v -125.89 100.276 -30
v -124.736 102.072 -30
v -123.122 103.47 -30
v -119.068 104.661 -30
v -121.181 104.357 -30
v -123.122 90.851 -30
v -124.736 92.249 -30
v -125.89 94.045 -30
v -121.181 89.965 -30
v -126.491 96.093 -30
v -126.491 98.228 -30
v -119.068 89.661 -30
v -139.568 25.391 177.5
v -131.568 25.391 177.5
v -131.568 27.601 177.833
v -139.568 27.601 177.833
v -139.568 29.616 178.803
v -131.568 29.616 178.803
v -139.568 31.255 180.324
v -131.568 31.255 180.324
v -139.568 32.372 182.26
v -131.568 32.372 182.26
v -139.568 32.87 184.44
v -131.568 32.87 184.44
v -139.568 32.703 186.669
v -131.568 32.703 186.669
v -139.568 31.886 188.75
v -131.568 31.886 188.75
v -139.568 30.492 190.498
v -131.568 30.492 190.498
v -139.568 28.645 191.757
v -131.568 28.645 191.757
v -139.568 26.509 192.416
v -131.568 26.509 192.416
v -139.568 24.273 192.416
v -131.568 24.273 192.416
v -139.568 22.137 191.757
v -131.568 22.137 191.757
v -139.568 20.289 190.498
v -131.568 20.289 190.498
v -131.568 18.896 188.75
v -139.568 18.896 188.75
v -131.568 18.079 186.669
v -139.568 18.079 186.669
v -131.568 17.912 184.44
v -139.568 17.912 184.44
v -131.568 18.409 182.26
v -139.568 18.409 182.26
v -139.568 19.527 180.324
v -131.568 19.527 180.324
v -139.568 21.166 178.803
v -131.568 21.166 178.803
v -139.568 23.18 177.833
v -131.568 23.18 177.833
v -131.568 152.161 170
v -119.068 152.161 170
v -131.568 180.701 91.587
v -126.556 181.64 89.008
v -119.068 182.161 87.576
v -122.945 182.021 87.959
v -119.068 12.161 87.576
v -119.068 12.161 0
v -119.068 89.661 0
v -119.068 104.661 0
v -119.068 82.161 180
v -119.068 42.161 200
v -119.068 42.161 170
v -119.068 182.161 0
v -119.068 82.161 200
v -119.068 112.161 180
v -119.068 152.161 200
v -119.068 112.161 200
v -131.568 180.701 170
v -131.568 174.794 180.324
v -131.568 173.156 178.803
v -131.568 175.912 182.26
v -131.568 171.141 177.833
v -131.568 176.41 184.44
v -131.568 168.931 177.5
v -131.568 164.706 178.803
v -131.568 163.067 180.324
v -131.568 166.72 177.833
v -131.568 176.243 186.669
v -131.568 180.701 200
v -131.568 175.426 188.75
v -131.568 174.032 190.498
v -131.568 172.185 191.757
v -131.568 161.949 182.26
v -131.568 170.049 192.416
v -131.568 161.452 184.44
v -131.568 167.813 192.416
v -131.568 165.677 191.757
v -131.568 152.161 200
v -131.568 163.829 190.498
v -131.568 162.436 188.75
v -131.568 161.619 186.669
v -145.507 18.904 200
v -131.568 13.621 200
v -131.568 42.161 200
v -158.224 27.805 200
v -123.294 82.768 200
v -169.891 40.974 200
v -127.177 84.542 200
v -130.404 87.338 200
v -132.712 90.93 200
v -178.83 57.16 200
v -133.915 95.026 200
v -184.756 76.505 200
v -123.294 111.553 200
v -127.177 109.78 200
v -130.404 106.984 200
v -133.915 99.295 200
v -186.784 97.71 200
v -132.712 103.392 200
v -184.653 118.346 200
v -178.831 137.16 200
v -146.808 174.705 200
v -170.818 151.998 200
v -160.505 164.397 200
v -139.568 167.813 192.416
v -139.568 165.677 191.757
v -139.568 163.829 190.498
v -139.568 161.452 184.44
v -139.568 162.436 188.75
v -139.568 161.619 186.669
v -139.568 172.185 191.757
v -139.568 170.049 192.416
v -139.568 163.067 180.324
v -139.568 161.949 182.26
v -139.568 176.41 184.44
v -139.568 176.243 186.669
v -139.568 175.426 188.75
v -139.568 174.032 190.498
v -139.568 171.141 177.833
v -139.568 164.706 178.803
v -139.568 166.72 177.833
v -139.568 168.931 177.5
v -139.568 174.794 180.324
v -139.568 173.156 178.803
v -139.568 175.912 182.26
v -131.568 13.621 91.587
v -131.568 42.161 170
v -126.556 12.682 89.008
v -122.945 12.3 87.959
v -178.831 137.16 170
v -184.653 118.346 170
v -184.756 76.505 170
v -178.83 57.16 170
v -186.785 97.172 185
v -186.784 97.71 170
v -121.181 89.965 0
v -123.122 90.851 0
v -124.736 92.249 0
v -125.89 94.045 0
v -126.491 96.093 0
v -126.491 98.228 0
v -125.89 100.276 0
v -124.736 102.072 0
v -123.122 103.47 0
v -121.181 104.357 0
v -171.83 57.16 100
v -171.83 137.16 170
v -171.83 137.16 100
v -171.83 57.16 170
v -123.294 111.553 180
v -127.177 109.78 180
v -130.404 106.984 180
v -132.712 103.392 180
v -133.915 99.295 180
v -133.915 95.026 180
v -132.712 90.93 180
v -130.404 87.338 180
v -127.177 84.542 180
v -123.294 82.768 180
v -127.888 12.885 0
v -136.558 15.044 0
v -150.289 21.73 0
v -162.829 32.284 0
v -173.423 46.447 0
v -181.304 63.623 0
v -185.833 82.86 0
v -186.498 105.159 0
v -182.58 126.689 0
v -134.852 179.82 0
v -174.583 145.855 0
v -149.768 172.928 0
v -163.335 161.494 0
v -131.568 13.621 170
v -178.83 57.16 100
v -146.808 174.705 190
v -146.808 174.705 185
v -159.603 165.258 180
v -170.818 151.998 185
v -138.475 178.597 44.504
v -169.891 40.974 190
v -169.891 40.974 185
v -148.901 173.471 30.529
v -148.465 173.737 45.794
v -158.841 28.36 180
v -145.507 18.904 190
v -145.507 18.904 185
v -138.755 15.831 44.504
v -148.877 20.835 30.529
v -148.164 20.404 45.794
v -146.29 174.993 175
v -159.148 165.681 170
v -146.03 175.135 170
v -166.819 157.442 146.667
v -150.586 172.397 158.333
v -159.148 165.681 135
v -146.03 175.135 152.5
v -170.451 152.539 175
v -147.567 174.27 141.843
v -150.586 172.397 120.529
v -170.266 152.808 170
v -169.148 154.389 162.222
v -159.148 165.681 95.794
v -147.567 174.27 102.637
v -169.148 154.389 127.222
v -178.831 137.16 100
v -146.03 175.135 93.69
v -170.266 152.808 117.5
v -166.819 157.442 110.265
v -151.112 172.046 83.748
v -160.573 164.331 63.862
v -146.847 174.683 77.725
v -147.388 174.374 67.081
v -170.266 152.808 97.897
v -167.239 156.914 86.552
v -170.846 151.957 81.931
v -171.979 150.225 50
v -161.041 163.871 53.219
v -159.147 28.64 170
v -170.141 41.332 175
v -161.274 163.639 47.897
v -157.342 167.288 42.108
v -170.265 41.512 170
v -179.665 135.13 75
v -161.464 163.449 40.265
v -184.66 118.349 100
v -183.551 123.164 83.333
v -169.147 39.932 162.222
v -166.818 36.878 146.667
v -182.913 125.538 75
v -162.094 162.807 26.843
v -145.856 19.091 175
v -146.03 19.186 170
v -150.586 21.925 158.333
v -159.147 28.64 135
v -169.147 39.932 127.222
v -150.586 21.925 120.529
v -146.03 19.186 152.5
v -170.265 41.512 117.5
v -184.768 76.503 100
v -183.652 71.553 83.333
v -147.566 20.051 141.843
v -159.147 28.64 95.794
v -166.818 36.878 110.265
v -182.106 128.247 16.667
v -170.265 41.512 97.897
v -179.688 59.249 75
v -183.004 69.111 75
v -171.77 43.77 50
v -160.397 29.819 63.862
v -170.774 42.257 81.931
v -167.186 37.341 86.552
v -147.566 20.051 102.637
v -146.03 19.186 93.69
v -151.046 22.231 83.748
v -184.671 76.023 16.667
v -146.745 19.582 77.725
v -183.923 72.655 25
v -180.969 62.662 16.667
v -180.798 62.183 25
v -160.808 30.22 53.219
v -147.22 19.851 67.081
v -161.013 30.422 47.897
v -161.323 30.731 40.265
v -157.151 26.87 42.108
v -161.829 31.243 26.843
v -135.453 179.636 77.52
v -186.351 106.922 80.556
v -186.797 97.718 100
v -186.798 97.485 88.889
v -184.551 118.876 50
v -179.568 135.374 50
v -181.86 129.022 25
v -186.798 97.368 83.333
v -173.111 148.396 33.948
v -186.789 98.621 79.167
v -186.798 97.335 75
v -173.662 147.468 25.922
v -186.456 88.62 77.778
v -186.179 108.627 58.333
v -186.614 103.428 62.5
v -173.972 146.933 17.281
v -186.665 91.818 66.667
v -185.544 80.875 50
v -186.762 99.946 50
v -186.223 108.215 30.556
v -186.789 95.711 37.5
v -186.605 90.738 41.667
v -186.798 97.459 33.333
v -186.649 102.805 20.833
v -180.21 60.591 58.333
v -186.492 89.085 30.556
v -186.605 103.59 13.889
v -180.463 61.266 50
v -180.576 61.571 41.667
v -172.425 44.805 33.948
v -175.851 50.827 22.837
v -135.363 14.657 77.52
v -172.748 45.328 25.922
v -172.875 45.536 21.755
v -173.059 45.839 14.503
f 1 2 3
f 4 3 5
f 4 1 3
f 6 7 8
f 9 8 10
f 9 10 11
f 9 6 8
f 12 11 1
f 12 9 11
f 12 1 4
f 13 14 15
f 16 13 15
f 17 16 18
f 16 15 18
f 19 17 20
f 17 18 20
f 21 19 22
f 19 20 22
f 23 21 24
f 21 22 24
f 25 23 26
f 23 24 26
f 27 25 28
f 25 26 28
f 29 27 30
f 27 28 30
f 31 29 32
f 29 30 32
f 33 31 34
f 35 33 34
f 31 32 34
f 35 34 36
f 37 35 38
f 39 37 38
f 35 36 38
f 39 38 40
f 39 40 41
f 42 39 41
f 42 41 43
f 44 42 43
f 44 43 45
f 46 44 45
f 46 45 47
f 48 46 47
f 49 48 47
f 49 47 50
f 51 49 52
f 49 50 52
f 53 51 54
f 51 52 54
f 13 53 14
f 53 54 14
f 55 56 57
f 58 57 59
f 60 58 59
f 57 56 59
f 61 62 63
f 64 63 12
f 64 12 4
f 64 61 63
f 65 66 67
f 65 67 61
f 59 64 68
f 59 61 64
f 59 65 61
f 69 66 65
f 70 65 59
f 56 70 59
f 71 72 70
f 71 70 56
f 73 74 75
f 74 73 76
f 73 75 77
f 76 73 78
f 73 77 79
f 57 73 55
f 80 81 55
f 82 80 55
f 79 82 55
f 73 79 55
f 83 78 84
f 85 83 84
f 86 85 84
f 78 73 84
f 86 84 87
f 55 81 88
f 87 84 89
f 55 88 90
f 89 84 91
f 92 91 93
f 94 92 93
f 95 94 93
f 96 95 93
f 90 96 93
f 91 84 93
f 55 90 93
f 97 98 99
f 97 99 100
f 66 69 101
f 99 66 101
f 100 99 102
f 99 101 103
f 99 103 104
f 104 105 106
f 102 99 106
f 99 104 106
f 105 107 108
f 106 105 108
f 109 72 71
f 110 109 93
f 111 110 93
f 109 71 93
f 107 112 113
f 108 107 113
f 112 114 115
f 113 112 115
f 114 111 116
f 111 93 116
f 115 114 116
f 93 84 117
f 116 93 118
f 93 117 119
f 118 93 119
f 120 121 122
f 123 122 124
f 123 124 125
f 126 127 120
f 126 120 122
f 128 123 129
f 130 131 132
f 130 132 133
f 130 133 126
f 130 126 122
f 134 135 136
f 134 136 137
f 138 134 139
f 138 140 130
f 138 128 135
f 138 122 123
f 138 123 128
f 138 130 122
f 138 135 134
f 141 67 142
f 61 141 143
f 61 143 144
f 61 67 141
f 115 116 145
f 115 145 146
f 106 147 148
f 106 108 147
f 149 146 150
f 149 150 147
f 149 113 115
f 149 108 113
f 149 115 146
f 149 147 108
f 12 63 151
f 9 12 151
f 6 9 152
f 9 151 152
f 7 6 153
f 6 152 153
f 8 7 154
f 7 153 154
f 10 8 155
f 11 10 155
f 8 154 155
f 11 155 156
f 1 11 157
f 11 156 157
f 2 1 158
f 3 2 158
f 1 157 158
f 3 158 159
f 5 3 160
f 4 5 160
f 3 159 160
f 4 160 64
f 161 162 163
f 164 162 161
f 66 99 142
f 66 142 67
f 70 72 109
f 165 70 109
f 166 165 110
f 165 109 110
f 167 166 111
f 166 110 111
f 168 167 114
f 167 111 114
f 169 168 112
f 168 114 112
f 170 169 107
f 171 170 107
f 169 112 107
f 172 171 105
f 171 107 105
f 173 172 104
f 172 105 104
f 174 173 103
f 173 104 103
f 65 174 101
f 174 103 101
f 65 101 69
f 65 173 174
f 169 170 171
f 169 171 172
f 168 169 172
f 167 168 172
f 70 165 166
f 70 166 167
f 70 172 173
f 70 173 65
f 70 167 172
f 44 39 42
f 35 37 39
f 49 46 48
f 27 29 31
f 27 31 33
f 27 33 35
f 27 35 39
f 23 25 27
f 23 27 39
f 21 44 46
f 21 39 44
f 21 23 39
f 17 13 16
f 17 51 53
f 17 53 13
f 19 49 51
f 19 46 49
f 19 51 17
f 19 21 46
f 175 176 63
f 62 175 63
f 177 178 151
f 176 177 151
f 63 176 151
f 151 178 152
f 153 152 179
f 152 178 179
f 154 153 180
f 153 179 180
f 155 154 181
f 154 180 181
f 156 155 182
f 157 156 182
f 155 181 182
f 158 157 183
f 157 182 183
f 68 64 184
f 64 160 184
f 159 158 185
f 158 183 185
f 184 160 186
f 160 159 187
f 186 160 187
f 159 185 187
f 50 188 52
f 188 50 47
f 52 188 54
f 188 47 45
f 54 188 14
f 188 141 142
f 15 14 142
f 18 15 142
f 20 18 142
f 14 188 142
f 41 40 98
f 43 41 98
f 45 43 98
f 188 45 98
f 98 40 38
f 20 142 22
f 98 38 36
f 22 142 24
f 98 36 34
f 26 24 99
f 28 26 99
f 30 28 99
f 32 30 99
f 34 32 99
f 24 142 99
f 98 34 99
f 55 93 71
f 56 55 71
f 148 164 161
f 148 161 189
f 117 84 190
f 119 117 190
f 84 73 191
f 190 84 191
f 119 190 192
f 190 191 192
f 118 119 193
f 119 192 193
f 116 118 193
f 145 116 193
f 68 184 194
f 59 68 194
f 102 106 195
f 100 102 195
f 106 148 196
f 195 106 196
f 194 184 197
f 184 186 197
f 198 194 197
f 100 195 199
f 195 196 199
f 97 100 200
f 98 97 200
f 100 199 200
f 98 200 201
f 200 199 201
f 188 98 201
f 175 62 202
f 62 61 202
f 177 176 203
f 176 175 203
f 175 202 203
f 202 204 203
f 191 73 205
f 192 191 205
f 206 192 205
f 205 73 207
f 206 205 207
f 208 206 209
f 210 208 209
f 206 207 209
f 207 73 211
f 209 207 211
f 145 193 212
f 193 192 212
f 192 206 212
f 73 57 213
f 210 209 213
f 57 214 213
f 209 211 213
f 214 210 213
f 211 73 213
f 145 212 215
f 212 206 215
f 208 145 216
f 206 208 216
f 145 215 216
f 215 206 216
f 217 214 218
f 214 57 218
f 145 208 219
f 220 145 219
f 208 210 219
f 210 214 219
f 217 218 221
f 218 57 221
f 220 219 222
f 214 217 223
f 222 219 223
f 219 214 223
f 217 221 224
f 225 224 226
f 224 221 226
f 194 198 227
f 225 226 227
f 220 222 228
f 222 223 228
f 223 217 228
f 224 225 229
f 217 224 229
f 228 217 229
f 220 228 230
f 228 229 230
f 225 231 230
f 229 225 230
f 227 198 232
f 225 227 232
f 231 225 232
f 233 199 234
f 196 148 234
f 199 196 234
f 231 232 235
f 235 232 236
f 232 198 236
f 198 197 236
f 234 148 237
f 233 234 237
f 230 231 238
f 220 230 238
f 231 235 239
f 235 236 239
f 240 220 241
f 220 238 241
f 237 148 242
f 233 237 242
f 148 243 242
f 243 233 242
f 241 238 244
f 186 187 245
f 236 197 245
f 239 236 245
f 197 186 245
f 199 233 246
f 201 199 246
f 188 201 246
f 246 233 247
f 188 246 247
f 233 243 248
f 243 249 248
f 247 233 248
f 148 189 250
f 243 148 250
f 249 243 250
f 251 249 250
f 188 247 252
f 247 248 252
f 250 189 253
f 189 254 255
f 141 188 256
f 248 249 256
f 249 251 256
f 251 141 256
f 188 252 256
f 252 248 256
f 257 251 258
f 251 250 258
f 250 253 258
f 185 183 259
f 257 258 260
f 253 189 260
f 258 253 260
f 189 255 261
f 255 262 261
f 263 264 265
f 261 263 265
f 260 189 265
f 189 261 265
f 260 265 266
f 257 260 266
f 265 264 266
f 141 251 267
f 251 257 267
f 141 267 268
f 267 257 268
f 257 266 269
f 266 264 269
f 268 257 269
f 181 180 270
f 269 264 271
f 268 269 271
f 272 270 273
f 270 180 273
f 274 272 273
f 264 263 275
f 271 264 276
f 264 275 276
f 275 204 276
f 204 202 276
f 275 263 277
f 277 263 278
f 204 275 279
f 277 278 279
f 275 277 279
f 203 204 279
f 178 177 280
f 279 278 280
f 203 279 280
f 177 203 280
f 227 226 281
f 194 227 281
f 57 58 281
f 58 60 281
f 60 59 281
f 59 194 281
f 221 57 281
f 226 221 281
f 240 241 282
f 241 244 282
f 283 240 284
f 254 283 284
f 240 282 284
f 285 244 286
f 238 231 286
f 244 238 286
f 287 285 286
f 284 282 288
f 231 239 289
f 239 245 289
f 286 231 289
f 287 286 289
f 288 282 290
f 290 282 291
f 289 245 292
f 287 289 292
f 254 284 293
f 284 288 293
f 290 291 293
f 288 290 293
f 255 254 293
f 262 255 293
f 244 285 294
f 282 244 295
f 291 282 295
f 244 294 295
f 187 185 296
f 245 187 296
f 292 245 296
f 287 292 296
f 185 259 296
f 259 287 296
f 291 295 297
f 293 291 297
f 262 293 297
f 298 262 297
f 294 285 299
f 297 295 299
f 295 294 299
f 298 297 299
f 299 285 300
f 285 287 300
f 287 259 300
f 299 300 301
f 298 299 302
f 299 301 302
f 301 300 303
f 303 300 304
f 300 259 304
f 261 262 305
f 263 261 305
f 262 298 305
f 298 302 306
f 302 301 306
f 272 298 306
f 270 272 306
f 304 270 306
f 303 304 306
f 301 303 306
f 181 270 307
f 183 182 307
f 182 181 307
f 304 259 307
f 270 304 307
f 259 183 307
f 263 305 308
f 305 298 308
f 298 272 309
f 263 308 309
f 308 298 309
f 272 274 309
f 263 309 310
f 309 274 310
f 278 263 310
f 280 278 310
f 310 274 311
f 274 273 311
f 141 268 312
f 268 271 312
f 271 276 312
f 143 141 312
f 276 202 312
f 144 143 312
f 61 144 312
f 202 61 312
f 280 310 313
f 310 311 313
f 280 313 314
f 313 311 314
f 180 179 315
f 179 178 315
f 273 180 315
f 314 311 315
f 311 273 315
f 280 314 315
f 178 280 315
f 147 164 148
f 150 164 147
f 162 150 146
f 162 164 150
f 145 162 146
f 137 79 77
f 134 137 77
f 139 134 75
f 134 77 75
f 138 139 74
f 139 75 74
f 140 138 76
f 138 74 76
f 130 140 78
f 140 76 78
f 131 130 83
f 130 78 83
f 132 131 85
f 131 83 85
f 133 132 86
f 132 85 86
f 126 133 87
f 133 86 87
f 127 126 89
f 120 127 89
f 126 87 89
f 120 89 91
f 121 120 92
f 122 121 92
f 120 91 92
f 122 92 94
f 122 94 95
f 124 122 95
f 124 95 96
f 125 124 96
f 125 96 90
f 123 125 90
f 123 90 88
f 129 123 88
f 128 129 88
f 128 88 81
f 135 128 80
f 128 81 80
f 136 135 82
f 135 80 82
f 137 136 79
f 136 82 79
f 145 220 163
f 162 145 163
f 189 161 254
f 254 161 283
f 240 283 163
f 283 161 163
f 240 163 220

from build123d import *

# Parameters (mm, degrees)
CROQUIS1_RX             = 85
CROQUIS1_RY             = 67.73101263
SALIENTE_EXTRUIR1_DEPTH = 200
CORTAR_EXTRUIR1_DEPTH   = 100
SALIENTE_EXTRUIR2_DEPTH = 30
CROQUIS5_R              = 7.5
SALIENTE_EXTRUIR3_DEPTH = 30
CORTAR_EXTRUIR3_DEPTH   = 30
CROQUIS8_W              = 83.299216536
CROQUIS8_H              = 210.979163193
CORTAR_EXTRUIR4_DEPTH   = 348.816388214
CROQUIS9_R              = 15
CORTAR_EXTRUIR5_DEPTH   = 20
CROQUIS10_R             = 7.5
CORTAR_EXTRUIR6_DEPTH   = 8
CORTAR_EXTRUIR7_DEPTH   = 12.5


with BuildPart() as part:
    # Croquis1 → Saliente-Extruir1 (new body)
    with BuildSketch(Plane.XY):
        with Locations(Location((-119.067557665, 97.160736636), (0, 0, 90))):
            Ellipse(CROQUIS1_RX, CROQUIS1_RY)
    extrude(amount=SALIENTE_EXTRUIR1_DEPTH)

    # Croquis3 → Cortar-Extruir1 (cut)
    with BuildSketch(Plane.XY.offset(200)):
        with BuildLine():
            Line((-171.829854236, 137.159885706), (-171.829854236, 57.159885706))
            Line((-171.829854236, 57.159885706), (-178.829854236, 57.159885706))
            add(Edge.make_bspline(
                [(-178.830577491, 137.159885706), (-195.829371976, 97.159643663), (-178.829854236, 57.159885706)],
                knots=[1.080850346, 1.080850346, 1.080850346, 2.060764999, 2.060764999, 2.060764999], degree=2, weights=[1, 0.882352941, 1]))
            Line((-178.830577491, 137.159885706), (-171.829854236, 137.159885706))
        make_face()
    extrude(amount=-CORTAR_EXTRUIR1_DEPTH, mode=Mode.SUBTRACT)

    # Croquis4 → Saliente-Extruir2 (add)
    with BuildSketch(Plane.XY.offset(200)):
        with BuildLine():
            Line((-178.830577491, 137.159885706), (-171.829854236, 137.159885706))
            Line((-171.829854236, 137.159885706), (-171.829854236, 57.159885706))
            Line((-171.829854236, 57.159885706), (-178.829854236, 57.159885706))
            add(Edge.make_bspline(
                [(-178.830577491, 137.159885706), (-195.797797403, 97.186782087), (-178.829854236, 57.159885706)],
                knots=[4.219557052, 4.219557052, 4.219557052, 5.198274326, 5.198274326, 5.198274326], degree=2, weights=[1, 0.882634519, 1]))
        make_face()
    extrude(amount=-SALIENTE_EXTRUIR2_DEPTH)

    # Croquis5 → Saliente-Extruir3 (add)
    with BuildSketch(Plane(origin=(0, 0, 0), x_dir=(-1, 0, 0), z_dir=(0, 0, -1))):
        with Locations(Location((119.067557665, 97.160736636, 0), (0, 0, 180))):
            Circle(CROQUIS5_R)
    extrude(amount=SALIENTE_EXTRUIR3_DEPTH)

    # Croquis7 → Cortar-Extruir3 (cut)
    with BuildSketch(Plane.XY.offset(200)):
        with BuildLine():
            Line((-131.567557665, 42.160736636), (-106.567557665, 42.160736636))
            Line((-106.567557665, 42.160736636), (-106.567557665, 13.620827843))
            add(Edge.make_bspline(
                [(-131.567557665, 13.620827843), (-119.067557665, 10.675126293), (-106.567557665, 13.620827843)],
                knots=[6.0975677, 6.0975677, 6.0975677, 6.468802915, 6.468802915, 6.468802915], degree=2, weights=[1, 0.982822456, 1]))
            Line((-131.567557665, 13.620827843), (-131.567557665, 42.160736636))
        make_face()
        with BuildLine():
            Line((-131.567557665, 180.700645429), (-131.567557665, 152.160736636))
            Line((-131.567557665, 152.160736636), (-106.567557665, 152.160736636))
            Line((-106.567557665, 152.160736636), (-106.567557665, 180.700645429))
            add(Edge.make_bspline(
                [(-106.567557665, 180.700645429), (-119.067557665, 183.64634698), (-131.567557665, 180.700645429)],
                knots=[2.955975046, 2.955975046, 2.955975046, 3.327210261, 3.327210261, 3.327210261], degree=2, weights=[1, 0.982822456, 1]))
        make_face()
    extrude(amount=-CORTAR_EXTRUIR3_DEPTH, mode=Mode.SUBTRACT)

    # Croquis8 → Cortar-Extruir4 (cut, through all)
    with BuildSketch(Plane.XY.offset(200)):
        with Locations((-77.417949397, 96.990041521)):
            Rectangle(CROQUIS8_W, CROQUIS8_H)
    extrude(amount=-CORTAR_EXTRUIR4_DEPTH, mode=Mode.SUBTRACT)

    # Croquis9 → Cortar-Extruir5 (cut)
    with BuildSketch(Plane.XY.offset(200)):
        with Locations((-119.067557665, 97.160736636)):
            Circle(CROQUIS9_R)
    extrude(amount=-CORTAR_EXTRUIR5_DEPTH, mode=Mode.SUBTRACT)

    # Croquis10 → Cortar-Extruir6 (cut)
    with BuildSketch(Plane(origin=(-131.567557665, 0, 0), x_dir=(0, 0, -1), z_dir=(1, 0, 0))):
        with Locations((-185, 168.930691033)):
            Circle(CROQUIS10_R)
        with Locations((-185, 25.39078224)):
            Circle(CROQUIS10_R)
    extrude(amount=-CORTAR_EXTRUIR6_DEPTH, mode=Mode.SUBTRACT)

    # Croquis11 → Cortar-Extruir7 (cut)
    with BuildSketch(Plane(origin=(-119.067557665, 0, 0), x_dir=(0, 0, -1), z_dir=(1, 0, 0))):
        Polygon((-170, 42.160736636), (-57.236885506, 1.118319437), (-170, -2.441940529), align=None)
        Polygon((-170, 152.160736636), (-58.81920935, 192.627235055), (-170, 211.002181537), align=None)
    extrude(amount=-CORTAR_EXTRUIR7_DEPTH, mode=Mode.SUBTRACT)


solid = part.part
